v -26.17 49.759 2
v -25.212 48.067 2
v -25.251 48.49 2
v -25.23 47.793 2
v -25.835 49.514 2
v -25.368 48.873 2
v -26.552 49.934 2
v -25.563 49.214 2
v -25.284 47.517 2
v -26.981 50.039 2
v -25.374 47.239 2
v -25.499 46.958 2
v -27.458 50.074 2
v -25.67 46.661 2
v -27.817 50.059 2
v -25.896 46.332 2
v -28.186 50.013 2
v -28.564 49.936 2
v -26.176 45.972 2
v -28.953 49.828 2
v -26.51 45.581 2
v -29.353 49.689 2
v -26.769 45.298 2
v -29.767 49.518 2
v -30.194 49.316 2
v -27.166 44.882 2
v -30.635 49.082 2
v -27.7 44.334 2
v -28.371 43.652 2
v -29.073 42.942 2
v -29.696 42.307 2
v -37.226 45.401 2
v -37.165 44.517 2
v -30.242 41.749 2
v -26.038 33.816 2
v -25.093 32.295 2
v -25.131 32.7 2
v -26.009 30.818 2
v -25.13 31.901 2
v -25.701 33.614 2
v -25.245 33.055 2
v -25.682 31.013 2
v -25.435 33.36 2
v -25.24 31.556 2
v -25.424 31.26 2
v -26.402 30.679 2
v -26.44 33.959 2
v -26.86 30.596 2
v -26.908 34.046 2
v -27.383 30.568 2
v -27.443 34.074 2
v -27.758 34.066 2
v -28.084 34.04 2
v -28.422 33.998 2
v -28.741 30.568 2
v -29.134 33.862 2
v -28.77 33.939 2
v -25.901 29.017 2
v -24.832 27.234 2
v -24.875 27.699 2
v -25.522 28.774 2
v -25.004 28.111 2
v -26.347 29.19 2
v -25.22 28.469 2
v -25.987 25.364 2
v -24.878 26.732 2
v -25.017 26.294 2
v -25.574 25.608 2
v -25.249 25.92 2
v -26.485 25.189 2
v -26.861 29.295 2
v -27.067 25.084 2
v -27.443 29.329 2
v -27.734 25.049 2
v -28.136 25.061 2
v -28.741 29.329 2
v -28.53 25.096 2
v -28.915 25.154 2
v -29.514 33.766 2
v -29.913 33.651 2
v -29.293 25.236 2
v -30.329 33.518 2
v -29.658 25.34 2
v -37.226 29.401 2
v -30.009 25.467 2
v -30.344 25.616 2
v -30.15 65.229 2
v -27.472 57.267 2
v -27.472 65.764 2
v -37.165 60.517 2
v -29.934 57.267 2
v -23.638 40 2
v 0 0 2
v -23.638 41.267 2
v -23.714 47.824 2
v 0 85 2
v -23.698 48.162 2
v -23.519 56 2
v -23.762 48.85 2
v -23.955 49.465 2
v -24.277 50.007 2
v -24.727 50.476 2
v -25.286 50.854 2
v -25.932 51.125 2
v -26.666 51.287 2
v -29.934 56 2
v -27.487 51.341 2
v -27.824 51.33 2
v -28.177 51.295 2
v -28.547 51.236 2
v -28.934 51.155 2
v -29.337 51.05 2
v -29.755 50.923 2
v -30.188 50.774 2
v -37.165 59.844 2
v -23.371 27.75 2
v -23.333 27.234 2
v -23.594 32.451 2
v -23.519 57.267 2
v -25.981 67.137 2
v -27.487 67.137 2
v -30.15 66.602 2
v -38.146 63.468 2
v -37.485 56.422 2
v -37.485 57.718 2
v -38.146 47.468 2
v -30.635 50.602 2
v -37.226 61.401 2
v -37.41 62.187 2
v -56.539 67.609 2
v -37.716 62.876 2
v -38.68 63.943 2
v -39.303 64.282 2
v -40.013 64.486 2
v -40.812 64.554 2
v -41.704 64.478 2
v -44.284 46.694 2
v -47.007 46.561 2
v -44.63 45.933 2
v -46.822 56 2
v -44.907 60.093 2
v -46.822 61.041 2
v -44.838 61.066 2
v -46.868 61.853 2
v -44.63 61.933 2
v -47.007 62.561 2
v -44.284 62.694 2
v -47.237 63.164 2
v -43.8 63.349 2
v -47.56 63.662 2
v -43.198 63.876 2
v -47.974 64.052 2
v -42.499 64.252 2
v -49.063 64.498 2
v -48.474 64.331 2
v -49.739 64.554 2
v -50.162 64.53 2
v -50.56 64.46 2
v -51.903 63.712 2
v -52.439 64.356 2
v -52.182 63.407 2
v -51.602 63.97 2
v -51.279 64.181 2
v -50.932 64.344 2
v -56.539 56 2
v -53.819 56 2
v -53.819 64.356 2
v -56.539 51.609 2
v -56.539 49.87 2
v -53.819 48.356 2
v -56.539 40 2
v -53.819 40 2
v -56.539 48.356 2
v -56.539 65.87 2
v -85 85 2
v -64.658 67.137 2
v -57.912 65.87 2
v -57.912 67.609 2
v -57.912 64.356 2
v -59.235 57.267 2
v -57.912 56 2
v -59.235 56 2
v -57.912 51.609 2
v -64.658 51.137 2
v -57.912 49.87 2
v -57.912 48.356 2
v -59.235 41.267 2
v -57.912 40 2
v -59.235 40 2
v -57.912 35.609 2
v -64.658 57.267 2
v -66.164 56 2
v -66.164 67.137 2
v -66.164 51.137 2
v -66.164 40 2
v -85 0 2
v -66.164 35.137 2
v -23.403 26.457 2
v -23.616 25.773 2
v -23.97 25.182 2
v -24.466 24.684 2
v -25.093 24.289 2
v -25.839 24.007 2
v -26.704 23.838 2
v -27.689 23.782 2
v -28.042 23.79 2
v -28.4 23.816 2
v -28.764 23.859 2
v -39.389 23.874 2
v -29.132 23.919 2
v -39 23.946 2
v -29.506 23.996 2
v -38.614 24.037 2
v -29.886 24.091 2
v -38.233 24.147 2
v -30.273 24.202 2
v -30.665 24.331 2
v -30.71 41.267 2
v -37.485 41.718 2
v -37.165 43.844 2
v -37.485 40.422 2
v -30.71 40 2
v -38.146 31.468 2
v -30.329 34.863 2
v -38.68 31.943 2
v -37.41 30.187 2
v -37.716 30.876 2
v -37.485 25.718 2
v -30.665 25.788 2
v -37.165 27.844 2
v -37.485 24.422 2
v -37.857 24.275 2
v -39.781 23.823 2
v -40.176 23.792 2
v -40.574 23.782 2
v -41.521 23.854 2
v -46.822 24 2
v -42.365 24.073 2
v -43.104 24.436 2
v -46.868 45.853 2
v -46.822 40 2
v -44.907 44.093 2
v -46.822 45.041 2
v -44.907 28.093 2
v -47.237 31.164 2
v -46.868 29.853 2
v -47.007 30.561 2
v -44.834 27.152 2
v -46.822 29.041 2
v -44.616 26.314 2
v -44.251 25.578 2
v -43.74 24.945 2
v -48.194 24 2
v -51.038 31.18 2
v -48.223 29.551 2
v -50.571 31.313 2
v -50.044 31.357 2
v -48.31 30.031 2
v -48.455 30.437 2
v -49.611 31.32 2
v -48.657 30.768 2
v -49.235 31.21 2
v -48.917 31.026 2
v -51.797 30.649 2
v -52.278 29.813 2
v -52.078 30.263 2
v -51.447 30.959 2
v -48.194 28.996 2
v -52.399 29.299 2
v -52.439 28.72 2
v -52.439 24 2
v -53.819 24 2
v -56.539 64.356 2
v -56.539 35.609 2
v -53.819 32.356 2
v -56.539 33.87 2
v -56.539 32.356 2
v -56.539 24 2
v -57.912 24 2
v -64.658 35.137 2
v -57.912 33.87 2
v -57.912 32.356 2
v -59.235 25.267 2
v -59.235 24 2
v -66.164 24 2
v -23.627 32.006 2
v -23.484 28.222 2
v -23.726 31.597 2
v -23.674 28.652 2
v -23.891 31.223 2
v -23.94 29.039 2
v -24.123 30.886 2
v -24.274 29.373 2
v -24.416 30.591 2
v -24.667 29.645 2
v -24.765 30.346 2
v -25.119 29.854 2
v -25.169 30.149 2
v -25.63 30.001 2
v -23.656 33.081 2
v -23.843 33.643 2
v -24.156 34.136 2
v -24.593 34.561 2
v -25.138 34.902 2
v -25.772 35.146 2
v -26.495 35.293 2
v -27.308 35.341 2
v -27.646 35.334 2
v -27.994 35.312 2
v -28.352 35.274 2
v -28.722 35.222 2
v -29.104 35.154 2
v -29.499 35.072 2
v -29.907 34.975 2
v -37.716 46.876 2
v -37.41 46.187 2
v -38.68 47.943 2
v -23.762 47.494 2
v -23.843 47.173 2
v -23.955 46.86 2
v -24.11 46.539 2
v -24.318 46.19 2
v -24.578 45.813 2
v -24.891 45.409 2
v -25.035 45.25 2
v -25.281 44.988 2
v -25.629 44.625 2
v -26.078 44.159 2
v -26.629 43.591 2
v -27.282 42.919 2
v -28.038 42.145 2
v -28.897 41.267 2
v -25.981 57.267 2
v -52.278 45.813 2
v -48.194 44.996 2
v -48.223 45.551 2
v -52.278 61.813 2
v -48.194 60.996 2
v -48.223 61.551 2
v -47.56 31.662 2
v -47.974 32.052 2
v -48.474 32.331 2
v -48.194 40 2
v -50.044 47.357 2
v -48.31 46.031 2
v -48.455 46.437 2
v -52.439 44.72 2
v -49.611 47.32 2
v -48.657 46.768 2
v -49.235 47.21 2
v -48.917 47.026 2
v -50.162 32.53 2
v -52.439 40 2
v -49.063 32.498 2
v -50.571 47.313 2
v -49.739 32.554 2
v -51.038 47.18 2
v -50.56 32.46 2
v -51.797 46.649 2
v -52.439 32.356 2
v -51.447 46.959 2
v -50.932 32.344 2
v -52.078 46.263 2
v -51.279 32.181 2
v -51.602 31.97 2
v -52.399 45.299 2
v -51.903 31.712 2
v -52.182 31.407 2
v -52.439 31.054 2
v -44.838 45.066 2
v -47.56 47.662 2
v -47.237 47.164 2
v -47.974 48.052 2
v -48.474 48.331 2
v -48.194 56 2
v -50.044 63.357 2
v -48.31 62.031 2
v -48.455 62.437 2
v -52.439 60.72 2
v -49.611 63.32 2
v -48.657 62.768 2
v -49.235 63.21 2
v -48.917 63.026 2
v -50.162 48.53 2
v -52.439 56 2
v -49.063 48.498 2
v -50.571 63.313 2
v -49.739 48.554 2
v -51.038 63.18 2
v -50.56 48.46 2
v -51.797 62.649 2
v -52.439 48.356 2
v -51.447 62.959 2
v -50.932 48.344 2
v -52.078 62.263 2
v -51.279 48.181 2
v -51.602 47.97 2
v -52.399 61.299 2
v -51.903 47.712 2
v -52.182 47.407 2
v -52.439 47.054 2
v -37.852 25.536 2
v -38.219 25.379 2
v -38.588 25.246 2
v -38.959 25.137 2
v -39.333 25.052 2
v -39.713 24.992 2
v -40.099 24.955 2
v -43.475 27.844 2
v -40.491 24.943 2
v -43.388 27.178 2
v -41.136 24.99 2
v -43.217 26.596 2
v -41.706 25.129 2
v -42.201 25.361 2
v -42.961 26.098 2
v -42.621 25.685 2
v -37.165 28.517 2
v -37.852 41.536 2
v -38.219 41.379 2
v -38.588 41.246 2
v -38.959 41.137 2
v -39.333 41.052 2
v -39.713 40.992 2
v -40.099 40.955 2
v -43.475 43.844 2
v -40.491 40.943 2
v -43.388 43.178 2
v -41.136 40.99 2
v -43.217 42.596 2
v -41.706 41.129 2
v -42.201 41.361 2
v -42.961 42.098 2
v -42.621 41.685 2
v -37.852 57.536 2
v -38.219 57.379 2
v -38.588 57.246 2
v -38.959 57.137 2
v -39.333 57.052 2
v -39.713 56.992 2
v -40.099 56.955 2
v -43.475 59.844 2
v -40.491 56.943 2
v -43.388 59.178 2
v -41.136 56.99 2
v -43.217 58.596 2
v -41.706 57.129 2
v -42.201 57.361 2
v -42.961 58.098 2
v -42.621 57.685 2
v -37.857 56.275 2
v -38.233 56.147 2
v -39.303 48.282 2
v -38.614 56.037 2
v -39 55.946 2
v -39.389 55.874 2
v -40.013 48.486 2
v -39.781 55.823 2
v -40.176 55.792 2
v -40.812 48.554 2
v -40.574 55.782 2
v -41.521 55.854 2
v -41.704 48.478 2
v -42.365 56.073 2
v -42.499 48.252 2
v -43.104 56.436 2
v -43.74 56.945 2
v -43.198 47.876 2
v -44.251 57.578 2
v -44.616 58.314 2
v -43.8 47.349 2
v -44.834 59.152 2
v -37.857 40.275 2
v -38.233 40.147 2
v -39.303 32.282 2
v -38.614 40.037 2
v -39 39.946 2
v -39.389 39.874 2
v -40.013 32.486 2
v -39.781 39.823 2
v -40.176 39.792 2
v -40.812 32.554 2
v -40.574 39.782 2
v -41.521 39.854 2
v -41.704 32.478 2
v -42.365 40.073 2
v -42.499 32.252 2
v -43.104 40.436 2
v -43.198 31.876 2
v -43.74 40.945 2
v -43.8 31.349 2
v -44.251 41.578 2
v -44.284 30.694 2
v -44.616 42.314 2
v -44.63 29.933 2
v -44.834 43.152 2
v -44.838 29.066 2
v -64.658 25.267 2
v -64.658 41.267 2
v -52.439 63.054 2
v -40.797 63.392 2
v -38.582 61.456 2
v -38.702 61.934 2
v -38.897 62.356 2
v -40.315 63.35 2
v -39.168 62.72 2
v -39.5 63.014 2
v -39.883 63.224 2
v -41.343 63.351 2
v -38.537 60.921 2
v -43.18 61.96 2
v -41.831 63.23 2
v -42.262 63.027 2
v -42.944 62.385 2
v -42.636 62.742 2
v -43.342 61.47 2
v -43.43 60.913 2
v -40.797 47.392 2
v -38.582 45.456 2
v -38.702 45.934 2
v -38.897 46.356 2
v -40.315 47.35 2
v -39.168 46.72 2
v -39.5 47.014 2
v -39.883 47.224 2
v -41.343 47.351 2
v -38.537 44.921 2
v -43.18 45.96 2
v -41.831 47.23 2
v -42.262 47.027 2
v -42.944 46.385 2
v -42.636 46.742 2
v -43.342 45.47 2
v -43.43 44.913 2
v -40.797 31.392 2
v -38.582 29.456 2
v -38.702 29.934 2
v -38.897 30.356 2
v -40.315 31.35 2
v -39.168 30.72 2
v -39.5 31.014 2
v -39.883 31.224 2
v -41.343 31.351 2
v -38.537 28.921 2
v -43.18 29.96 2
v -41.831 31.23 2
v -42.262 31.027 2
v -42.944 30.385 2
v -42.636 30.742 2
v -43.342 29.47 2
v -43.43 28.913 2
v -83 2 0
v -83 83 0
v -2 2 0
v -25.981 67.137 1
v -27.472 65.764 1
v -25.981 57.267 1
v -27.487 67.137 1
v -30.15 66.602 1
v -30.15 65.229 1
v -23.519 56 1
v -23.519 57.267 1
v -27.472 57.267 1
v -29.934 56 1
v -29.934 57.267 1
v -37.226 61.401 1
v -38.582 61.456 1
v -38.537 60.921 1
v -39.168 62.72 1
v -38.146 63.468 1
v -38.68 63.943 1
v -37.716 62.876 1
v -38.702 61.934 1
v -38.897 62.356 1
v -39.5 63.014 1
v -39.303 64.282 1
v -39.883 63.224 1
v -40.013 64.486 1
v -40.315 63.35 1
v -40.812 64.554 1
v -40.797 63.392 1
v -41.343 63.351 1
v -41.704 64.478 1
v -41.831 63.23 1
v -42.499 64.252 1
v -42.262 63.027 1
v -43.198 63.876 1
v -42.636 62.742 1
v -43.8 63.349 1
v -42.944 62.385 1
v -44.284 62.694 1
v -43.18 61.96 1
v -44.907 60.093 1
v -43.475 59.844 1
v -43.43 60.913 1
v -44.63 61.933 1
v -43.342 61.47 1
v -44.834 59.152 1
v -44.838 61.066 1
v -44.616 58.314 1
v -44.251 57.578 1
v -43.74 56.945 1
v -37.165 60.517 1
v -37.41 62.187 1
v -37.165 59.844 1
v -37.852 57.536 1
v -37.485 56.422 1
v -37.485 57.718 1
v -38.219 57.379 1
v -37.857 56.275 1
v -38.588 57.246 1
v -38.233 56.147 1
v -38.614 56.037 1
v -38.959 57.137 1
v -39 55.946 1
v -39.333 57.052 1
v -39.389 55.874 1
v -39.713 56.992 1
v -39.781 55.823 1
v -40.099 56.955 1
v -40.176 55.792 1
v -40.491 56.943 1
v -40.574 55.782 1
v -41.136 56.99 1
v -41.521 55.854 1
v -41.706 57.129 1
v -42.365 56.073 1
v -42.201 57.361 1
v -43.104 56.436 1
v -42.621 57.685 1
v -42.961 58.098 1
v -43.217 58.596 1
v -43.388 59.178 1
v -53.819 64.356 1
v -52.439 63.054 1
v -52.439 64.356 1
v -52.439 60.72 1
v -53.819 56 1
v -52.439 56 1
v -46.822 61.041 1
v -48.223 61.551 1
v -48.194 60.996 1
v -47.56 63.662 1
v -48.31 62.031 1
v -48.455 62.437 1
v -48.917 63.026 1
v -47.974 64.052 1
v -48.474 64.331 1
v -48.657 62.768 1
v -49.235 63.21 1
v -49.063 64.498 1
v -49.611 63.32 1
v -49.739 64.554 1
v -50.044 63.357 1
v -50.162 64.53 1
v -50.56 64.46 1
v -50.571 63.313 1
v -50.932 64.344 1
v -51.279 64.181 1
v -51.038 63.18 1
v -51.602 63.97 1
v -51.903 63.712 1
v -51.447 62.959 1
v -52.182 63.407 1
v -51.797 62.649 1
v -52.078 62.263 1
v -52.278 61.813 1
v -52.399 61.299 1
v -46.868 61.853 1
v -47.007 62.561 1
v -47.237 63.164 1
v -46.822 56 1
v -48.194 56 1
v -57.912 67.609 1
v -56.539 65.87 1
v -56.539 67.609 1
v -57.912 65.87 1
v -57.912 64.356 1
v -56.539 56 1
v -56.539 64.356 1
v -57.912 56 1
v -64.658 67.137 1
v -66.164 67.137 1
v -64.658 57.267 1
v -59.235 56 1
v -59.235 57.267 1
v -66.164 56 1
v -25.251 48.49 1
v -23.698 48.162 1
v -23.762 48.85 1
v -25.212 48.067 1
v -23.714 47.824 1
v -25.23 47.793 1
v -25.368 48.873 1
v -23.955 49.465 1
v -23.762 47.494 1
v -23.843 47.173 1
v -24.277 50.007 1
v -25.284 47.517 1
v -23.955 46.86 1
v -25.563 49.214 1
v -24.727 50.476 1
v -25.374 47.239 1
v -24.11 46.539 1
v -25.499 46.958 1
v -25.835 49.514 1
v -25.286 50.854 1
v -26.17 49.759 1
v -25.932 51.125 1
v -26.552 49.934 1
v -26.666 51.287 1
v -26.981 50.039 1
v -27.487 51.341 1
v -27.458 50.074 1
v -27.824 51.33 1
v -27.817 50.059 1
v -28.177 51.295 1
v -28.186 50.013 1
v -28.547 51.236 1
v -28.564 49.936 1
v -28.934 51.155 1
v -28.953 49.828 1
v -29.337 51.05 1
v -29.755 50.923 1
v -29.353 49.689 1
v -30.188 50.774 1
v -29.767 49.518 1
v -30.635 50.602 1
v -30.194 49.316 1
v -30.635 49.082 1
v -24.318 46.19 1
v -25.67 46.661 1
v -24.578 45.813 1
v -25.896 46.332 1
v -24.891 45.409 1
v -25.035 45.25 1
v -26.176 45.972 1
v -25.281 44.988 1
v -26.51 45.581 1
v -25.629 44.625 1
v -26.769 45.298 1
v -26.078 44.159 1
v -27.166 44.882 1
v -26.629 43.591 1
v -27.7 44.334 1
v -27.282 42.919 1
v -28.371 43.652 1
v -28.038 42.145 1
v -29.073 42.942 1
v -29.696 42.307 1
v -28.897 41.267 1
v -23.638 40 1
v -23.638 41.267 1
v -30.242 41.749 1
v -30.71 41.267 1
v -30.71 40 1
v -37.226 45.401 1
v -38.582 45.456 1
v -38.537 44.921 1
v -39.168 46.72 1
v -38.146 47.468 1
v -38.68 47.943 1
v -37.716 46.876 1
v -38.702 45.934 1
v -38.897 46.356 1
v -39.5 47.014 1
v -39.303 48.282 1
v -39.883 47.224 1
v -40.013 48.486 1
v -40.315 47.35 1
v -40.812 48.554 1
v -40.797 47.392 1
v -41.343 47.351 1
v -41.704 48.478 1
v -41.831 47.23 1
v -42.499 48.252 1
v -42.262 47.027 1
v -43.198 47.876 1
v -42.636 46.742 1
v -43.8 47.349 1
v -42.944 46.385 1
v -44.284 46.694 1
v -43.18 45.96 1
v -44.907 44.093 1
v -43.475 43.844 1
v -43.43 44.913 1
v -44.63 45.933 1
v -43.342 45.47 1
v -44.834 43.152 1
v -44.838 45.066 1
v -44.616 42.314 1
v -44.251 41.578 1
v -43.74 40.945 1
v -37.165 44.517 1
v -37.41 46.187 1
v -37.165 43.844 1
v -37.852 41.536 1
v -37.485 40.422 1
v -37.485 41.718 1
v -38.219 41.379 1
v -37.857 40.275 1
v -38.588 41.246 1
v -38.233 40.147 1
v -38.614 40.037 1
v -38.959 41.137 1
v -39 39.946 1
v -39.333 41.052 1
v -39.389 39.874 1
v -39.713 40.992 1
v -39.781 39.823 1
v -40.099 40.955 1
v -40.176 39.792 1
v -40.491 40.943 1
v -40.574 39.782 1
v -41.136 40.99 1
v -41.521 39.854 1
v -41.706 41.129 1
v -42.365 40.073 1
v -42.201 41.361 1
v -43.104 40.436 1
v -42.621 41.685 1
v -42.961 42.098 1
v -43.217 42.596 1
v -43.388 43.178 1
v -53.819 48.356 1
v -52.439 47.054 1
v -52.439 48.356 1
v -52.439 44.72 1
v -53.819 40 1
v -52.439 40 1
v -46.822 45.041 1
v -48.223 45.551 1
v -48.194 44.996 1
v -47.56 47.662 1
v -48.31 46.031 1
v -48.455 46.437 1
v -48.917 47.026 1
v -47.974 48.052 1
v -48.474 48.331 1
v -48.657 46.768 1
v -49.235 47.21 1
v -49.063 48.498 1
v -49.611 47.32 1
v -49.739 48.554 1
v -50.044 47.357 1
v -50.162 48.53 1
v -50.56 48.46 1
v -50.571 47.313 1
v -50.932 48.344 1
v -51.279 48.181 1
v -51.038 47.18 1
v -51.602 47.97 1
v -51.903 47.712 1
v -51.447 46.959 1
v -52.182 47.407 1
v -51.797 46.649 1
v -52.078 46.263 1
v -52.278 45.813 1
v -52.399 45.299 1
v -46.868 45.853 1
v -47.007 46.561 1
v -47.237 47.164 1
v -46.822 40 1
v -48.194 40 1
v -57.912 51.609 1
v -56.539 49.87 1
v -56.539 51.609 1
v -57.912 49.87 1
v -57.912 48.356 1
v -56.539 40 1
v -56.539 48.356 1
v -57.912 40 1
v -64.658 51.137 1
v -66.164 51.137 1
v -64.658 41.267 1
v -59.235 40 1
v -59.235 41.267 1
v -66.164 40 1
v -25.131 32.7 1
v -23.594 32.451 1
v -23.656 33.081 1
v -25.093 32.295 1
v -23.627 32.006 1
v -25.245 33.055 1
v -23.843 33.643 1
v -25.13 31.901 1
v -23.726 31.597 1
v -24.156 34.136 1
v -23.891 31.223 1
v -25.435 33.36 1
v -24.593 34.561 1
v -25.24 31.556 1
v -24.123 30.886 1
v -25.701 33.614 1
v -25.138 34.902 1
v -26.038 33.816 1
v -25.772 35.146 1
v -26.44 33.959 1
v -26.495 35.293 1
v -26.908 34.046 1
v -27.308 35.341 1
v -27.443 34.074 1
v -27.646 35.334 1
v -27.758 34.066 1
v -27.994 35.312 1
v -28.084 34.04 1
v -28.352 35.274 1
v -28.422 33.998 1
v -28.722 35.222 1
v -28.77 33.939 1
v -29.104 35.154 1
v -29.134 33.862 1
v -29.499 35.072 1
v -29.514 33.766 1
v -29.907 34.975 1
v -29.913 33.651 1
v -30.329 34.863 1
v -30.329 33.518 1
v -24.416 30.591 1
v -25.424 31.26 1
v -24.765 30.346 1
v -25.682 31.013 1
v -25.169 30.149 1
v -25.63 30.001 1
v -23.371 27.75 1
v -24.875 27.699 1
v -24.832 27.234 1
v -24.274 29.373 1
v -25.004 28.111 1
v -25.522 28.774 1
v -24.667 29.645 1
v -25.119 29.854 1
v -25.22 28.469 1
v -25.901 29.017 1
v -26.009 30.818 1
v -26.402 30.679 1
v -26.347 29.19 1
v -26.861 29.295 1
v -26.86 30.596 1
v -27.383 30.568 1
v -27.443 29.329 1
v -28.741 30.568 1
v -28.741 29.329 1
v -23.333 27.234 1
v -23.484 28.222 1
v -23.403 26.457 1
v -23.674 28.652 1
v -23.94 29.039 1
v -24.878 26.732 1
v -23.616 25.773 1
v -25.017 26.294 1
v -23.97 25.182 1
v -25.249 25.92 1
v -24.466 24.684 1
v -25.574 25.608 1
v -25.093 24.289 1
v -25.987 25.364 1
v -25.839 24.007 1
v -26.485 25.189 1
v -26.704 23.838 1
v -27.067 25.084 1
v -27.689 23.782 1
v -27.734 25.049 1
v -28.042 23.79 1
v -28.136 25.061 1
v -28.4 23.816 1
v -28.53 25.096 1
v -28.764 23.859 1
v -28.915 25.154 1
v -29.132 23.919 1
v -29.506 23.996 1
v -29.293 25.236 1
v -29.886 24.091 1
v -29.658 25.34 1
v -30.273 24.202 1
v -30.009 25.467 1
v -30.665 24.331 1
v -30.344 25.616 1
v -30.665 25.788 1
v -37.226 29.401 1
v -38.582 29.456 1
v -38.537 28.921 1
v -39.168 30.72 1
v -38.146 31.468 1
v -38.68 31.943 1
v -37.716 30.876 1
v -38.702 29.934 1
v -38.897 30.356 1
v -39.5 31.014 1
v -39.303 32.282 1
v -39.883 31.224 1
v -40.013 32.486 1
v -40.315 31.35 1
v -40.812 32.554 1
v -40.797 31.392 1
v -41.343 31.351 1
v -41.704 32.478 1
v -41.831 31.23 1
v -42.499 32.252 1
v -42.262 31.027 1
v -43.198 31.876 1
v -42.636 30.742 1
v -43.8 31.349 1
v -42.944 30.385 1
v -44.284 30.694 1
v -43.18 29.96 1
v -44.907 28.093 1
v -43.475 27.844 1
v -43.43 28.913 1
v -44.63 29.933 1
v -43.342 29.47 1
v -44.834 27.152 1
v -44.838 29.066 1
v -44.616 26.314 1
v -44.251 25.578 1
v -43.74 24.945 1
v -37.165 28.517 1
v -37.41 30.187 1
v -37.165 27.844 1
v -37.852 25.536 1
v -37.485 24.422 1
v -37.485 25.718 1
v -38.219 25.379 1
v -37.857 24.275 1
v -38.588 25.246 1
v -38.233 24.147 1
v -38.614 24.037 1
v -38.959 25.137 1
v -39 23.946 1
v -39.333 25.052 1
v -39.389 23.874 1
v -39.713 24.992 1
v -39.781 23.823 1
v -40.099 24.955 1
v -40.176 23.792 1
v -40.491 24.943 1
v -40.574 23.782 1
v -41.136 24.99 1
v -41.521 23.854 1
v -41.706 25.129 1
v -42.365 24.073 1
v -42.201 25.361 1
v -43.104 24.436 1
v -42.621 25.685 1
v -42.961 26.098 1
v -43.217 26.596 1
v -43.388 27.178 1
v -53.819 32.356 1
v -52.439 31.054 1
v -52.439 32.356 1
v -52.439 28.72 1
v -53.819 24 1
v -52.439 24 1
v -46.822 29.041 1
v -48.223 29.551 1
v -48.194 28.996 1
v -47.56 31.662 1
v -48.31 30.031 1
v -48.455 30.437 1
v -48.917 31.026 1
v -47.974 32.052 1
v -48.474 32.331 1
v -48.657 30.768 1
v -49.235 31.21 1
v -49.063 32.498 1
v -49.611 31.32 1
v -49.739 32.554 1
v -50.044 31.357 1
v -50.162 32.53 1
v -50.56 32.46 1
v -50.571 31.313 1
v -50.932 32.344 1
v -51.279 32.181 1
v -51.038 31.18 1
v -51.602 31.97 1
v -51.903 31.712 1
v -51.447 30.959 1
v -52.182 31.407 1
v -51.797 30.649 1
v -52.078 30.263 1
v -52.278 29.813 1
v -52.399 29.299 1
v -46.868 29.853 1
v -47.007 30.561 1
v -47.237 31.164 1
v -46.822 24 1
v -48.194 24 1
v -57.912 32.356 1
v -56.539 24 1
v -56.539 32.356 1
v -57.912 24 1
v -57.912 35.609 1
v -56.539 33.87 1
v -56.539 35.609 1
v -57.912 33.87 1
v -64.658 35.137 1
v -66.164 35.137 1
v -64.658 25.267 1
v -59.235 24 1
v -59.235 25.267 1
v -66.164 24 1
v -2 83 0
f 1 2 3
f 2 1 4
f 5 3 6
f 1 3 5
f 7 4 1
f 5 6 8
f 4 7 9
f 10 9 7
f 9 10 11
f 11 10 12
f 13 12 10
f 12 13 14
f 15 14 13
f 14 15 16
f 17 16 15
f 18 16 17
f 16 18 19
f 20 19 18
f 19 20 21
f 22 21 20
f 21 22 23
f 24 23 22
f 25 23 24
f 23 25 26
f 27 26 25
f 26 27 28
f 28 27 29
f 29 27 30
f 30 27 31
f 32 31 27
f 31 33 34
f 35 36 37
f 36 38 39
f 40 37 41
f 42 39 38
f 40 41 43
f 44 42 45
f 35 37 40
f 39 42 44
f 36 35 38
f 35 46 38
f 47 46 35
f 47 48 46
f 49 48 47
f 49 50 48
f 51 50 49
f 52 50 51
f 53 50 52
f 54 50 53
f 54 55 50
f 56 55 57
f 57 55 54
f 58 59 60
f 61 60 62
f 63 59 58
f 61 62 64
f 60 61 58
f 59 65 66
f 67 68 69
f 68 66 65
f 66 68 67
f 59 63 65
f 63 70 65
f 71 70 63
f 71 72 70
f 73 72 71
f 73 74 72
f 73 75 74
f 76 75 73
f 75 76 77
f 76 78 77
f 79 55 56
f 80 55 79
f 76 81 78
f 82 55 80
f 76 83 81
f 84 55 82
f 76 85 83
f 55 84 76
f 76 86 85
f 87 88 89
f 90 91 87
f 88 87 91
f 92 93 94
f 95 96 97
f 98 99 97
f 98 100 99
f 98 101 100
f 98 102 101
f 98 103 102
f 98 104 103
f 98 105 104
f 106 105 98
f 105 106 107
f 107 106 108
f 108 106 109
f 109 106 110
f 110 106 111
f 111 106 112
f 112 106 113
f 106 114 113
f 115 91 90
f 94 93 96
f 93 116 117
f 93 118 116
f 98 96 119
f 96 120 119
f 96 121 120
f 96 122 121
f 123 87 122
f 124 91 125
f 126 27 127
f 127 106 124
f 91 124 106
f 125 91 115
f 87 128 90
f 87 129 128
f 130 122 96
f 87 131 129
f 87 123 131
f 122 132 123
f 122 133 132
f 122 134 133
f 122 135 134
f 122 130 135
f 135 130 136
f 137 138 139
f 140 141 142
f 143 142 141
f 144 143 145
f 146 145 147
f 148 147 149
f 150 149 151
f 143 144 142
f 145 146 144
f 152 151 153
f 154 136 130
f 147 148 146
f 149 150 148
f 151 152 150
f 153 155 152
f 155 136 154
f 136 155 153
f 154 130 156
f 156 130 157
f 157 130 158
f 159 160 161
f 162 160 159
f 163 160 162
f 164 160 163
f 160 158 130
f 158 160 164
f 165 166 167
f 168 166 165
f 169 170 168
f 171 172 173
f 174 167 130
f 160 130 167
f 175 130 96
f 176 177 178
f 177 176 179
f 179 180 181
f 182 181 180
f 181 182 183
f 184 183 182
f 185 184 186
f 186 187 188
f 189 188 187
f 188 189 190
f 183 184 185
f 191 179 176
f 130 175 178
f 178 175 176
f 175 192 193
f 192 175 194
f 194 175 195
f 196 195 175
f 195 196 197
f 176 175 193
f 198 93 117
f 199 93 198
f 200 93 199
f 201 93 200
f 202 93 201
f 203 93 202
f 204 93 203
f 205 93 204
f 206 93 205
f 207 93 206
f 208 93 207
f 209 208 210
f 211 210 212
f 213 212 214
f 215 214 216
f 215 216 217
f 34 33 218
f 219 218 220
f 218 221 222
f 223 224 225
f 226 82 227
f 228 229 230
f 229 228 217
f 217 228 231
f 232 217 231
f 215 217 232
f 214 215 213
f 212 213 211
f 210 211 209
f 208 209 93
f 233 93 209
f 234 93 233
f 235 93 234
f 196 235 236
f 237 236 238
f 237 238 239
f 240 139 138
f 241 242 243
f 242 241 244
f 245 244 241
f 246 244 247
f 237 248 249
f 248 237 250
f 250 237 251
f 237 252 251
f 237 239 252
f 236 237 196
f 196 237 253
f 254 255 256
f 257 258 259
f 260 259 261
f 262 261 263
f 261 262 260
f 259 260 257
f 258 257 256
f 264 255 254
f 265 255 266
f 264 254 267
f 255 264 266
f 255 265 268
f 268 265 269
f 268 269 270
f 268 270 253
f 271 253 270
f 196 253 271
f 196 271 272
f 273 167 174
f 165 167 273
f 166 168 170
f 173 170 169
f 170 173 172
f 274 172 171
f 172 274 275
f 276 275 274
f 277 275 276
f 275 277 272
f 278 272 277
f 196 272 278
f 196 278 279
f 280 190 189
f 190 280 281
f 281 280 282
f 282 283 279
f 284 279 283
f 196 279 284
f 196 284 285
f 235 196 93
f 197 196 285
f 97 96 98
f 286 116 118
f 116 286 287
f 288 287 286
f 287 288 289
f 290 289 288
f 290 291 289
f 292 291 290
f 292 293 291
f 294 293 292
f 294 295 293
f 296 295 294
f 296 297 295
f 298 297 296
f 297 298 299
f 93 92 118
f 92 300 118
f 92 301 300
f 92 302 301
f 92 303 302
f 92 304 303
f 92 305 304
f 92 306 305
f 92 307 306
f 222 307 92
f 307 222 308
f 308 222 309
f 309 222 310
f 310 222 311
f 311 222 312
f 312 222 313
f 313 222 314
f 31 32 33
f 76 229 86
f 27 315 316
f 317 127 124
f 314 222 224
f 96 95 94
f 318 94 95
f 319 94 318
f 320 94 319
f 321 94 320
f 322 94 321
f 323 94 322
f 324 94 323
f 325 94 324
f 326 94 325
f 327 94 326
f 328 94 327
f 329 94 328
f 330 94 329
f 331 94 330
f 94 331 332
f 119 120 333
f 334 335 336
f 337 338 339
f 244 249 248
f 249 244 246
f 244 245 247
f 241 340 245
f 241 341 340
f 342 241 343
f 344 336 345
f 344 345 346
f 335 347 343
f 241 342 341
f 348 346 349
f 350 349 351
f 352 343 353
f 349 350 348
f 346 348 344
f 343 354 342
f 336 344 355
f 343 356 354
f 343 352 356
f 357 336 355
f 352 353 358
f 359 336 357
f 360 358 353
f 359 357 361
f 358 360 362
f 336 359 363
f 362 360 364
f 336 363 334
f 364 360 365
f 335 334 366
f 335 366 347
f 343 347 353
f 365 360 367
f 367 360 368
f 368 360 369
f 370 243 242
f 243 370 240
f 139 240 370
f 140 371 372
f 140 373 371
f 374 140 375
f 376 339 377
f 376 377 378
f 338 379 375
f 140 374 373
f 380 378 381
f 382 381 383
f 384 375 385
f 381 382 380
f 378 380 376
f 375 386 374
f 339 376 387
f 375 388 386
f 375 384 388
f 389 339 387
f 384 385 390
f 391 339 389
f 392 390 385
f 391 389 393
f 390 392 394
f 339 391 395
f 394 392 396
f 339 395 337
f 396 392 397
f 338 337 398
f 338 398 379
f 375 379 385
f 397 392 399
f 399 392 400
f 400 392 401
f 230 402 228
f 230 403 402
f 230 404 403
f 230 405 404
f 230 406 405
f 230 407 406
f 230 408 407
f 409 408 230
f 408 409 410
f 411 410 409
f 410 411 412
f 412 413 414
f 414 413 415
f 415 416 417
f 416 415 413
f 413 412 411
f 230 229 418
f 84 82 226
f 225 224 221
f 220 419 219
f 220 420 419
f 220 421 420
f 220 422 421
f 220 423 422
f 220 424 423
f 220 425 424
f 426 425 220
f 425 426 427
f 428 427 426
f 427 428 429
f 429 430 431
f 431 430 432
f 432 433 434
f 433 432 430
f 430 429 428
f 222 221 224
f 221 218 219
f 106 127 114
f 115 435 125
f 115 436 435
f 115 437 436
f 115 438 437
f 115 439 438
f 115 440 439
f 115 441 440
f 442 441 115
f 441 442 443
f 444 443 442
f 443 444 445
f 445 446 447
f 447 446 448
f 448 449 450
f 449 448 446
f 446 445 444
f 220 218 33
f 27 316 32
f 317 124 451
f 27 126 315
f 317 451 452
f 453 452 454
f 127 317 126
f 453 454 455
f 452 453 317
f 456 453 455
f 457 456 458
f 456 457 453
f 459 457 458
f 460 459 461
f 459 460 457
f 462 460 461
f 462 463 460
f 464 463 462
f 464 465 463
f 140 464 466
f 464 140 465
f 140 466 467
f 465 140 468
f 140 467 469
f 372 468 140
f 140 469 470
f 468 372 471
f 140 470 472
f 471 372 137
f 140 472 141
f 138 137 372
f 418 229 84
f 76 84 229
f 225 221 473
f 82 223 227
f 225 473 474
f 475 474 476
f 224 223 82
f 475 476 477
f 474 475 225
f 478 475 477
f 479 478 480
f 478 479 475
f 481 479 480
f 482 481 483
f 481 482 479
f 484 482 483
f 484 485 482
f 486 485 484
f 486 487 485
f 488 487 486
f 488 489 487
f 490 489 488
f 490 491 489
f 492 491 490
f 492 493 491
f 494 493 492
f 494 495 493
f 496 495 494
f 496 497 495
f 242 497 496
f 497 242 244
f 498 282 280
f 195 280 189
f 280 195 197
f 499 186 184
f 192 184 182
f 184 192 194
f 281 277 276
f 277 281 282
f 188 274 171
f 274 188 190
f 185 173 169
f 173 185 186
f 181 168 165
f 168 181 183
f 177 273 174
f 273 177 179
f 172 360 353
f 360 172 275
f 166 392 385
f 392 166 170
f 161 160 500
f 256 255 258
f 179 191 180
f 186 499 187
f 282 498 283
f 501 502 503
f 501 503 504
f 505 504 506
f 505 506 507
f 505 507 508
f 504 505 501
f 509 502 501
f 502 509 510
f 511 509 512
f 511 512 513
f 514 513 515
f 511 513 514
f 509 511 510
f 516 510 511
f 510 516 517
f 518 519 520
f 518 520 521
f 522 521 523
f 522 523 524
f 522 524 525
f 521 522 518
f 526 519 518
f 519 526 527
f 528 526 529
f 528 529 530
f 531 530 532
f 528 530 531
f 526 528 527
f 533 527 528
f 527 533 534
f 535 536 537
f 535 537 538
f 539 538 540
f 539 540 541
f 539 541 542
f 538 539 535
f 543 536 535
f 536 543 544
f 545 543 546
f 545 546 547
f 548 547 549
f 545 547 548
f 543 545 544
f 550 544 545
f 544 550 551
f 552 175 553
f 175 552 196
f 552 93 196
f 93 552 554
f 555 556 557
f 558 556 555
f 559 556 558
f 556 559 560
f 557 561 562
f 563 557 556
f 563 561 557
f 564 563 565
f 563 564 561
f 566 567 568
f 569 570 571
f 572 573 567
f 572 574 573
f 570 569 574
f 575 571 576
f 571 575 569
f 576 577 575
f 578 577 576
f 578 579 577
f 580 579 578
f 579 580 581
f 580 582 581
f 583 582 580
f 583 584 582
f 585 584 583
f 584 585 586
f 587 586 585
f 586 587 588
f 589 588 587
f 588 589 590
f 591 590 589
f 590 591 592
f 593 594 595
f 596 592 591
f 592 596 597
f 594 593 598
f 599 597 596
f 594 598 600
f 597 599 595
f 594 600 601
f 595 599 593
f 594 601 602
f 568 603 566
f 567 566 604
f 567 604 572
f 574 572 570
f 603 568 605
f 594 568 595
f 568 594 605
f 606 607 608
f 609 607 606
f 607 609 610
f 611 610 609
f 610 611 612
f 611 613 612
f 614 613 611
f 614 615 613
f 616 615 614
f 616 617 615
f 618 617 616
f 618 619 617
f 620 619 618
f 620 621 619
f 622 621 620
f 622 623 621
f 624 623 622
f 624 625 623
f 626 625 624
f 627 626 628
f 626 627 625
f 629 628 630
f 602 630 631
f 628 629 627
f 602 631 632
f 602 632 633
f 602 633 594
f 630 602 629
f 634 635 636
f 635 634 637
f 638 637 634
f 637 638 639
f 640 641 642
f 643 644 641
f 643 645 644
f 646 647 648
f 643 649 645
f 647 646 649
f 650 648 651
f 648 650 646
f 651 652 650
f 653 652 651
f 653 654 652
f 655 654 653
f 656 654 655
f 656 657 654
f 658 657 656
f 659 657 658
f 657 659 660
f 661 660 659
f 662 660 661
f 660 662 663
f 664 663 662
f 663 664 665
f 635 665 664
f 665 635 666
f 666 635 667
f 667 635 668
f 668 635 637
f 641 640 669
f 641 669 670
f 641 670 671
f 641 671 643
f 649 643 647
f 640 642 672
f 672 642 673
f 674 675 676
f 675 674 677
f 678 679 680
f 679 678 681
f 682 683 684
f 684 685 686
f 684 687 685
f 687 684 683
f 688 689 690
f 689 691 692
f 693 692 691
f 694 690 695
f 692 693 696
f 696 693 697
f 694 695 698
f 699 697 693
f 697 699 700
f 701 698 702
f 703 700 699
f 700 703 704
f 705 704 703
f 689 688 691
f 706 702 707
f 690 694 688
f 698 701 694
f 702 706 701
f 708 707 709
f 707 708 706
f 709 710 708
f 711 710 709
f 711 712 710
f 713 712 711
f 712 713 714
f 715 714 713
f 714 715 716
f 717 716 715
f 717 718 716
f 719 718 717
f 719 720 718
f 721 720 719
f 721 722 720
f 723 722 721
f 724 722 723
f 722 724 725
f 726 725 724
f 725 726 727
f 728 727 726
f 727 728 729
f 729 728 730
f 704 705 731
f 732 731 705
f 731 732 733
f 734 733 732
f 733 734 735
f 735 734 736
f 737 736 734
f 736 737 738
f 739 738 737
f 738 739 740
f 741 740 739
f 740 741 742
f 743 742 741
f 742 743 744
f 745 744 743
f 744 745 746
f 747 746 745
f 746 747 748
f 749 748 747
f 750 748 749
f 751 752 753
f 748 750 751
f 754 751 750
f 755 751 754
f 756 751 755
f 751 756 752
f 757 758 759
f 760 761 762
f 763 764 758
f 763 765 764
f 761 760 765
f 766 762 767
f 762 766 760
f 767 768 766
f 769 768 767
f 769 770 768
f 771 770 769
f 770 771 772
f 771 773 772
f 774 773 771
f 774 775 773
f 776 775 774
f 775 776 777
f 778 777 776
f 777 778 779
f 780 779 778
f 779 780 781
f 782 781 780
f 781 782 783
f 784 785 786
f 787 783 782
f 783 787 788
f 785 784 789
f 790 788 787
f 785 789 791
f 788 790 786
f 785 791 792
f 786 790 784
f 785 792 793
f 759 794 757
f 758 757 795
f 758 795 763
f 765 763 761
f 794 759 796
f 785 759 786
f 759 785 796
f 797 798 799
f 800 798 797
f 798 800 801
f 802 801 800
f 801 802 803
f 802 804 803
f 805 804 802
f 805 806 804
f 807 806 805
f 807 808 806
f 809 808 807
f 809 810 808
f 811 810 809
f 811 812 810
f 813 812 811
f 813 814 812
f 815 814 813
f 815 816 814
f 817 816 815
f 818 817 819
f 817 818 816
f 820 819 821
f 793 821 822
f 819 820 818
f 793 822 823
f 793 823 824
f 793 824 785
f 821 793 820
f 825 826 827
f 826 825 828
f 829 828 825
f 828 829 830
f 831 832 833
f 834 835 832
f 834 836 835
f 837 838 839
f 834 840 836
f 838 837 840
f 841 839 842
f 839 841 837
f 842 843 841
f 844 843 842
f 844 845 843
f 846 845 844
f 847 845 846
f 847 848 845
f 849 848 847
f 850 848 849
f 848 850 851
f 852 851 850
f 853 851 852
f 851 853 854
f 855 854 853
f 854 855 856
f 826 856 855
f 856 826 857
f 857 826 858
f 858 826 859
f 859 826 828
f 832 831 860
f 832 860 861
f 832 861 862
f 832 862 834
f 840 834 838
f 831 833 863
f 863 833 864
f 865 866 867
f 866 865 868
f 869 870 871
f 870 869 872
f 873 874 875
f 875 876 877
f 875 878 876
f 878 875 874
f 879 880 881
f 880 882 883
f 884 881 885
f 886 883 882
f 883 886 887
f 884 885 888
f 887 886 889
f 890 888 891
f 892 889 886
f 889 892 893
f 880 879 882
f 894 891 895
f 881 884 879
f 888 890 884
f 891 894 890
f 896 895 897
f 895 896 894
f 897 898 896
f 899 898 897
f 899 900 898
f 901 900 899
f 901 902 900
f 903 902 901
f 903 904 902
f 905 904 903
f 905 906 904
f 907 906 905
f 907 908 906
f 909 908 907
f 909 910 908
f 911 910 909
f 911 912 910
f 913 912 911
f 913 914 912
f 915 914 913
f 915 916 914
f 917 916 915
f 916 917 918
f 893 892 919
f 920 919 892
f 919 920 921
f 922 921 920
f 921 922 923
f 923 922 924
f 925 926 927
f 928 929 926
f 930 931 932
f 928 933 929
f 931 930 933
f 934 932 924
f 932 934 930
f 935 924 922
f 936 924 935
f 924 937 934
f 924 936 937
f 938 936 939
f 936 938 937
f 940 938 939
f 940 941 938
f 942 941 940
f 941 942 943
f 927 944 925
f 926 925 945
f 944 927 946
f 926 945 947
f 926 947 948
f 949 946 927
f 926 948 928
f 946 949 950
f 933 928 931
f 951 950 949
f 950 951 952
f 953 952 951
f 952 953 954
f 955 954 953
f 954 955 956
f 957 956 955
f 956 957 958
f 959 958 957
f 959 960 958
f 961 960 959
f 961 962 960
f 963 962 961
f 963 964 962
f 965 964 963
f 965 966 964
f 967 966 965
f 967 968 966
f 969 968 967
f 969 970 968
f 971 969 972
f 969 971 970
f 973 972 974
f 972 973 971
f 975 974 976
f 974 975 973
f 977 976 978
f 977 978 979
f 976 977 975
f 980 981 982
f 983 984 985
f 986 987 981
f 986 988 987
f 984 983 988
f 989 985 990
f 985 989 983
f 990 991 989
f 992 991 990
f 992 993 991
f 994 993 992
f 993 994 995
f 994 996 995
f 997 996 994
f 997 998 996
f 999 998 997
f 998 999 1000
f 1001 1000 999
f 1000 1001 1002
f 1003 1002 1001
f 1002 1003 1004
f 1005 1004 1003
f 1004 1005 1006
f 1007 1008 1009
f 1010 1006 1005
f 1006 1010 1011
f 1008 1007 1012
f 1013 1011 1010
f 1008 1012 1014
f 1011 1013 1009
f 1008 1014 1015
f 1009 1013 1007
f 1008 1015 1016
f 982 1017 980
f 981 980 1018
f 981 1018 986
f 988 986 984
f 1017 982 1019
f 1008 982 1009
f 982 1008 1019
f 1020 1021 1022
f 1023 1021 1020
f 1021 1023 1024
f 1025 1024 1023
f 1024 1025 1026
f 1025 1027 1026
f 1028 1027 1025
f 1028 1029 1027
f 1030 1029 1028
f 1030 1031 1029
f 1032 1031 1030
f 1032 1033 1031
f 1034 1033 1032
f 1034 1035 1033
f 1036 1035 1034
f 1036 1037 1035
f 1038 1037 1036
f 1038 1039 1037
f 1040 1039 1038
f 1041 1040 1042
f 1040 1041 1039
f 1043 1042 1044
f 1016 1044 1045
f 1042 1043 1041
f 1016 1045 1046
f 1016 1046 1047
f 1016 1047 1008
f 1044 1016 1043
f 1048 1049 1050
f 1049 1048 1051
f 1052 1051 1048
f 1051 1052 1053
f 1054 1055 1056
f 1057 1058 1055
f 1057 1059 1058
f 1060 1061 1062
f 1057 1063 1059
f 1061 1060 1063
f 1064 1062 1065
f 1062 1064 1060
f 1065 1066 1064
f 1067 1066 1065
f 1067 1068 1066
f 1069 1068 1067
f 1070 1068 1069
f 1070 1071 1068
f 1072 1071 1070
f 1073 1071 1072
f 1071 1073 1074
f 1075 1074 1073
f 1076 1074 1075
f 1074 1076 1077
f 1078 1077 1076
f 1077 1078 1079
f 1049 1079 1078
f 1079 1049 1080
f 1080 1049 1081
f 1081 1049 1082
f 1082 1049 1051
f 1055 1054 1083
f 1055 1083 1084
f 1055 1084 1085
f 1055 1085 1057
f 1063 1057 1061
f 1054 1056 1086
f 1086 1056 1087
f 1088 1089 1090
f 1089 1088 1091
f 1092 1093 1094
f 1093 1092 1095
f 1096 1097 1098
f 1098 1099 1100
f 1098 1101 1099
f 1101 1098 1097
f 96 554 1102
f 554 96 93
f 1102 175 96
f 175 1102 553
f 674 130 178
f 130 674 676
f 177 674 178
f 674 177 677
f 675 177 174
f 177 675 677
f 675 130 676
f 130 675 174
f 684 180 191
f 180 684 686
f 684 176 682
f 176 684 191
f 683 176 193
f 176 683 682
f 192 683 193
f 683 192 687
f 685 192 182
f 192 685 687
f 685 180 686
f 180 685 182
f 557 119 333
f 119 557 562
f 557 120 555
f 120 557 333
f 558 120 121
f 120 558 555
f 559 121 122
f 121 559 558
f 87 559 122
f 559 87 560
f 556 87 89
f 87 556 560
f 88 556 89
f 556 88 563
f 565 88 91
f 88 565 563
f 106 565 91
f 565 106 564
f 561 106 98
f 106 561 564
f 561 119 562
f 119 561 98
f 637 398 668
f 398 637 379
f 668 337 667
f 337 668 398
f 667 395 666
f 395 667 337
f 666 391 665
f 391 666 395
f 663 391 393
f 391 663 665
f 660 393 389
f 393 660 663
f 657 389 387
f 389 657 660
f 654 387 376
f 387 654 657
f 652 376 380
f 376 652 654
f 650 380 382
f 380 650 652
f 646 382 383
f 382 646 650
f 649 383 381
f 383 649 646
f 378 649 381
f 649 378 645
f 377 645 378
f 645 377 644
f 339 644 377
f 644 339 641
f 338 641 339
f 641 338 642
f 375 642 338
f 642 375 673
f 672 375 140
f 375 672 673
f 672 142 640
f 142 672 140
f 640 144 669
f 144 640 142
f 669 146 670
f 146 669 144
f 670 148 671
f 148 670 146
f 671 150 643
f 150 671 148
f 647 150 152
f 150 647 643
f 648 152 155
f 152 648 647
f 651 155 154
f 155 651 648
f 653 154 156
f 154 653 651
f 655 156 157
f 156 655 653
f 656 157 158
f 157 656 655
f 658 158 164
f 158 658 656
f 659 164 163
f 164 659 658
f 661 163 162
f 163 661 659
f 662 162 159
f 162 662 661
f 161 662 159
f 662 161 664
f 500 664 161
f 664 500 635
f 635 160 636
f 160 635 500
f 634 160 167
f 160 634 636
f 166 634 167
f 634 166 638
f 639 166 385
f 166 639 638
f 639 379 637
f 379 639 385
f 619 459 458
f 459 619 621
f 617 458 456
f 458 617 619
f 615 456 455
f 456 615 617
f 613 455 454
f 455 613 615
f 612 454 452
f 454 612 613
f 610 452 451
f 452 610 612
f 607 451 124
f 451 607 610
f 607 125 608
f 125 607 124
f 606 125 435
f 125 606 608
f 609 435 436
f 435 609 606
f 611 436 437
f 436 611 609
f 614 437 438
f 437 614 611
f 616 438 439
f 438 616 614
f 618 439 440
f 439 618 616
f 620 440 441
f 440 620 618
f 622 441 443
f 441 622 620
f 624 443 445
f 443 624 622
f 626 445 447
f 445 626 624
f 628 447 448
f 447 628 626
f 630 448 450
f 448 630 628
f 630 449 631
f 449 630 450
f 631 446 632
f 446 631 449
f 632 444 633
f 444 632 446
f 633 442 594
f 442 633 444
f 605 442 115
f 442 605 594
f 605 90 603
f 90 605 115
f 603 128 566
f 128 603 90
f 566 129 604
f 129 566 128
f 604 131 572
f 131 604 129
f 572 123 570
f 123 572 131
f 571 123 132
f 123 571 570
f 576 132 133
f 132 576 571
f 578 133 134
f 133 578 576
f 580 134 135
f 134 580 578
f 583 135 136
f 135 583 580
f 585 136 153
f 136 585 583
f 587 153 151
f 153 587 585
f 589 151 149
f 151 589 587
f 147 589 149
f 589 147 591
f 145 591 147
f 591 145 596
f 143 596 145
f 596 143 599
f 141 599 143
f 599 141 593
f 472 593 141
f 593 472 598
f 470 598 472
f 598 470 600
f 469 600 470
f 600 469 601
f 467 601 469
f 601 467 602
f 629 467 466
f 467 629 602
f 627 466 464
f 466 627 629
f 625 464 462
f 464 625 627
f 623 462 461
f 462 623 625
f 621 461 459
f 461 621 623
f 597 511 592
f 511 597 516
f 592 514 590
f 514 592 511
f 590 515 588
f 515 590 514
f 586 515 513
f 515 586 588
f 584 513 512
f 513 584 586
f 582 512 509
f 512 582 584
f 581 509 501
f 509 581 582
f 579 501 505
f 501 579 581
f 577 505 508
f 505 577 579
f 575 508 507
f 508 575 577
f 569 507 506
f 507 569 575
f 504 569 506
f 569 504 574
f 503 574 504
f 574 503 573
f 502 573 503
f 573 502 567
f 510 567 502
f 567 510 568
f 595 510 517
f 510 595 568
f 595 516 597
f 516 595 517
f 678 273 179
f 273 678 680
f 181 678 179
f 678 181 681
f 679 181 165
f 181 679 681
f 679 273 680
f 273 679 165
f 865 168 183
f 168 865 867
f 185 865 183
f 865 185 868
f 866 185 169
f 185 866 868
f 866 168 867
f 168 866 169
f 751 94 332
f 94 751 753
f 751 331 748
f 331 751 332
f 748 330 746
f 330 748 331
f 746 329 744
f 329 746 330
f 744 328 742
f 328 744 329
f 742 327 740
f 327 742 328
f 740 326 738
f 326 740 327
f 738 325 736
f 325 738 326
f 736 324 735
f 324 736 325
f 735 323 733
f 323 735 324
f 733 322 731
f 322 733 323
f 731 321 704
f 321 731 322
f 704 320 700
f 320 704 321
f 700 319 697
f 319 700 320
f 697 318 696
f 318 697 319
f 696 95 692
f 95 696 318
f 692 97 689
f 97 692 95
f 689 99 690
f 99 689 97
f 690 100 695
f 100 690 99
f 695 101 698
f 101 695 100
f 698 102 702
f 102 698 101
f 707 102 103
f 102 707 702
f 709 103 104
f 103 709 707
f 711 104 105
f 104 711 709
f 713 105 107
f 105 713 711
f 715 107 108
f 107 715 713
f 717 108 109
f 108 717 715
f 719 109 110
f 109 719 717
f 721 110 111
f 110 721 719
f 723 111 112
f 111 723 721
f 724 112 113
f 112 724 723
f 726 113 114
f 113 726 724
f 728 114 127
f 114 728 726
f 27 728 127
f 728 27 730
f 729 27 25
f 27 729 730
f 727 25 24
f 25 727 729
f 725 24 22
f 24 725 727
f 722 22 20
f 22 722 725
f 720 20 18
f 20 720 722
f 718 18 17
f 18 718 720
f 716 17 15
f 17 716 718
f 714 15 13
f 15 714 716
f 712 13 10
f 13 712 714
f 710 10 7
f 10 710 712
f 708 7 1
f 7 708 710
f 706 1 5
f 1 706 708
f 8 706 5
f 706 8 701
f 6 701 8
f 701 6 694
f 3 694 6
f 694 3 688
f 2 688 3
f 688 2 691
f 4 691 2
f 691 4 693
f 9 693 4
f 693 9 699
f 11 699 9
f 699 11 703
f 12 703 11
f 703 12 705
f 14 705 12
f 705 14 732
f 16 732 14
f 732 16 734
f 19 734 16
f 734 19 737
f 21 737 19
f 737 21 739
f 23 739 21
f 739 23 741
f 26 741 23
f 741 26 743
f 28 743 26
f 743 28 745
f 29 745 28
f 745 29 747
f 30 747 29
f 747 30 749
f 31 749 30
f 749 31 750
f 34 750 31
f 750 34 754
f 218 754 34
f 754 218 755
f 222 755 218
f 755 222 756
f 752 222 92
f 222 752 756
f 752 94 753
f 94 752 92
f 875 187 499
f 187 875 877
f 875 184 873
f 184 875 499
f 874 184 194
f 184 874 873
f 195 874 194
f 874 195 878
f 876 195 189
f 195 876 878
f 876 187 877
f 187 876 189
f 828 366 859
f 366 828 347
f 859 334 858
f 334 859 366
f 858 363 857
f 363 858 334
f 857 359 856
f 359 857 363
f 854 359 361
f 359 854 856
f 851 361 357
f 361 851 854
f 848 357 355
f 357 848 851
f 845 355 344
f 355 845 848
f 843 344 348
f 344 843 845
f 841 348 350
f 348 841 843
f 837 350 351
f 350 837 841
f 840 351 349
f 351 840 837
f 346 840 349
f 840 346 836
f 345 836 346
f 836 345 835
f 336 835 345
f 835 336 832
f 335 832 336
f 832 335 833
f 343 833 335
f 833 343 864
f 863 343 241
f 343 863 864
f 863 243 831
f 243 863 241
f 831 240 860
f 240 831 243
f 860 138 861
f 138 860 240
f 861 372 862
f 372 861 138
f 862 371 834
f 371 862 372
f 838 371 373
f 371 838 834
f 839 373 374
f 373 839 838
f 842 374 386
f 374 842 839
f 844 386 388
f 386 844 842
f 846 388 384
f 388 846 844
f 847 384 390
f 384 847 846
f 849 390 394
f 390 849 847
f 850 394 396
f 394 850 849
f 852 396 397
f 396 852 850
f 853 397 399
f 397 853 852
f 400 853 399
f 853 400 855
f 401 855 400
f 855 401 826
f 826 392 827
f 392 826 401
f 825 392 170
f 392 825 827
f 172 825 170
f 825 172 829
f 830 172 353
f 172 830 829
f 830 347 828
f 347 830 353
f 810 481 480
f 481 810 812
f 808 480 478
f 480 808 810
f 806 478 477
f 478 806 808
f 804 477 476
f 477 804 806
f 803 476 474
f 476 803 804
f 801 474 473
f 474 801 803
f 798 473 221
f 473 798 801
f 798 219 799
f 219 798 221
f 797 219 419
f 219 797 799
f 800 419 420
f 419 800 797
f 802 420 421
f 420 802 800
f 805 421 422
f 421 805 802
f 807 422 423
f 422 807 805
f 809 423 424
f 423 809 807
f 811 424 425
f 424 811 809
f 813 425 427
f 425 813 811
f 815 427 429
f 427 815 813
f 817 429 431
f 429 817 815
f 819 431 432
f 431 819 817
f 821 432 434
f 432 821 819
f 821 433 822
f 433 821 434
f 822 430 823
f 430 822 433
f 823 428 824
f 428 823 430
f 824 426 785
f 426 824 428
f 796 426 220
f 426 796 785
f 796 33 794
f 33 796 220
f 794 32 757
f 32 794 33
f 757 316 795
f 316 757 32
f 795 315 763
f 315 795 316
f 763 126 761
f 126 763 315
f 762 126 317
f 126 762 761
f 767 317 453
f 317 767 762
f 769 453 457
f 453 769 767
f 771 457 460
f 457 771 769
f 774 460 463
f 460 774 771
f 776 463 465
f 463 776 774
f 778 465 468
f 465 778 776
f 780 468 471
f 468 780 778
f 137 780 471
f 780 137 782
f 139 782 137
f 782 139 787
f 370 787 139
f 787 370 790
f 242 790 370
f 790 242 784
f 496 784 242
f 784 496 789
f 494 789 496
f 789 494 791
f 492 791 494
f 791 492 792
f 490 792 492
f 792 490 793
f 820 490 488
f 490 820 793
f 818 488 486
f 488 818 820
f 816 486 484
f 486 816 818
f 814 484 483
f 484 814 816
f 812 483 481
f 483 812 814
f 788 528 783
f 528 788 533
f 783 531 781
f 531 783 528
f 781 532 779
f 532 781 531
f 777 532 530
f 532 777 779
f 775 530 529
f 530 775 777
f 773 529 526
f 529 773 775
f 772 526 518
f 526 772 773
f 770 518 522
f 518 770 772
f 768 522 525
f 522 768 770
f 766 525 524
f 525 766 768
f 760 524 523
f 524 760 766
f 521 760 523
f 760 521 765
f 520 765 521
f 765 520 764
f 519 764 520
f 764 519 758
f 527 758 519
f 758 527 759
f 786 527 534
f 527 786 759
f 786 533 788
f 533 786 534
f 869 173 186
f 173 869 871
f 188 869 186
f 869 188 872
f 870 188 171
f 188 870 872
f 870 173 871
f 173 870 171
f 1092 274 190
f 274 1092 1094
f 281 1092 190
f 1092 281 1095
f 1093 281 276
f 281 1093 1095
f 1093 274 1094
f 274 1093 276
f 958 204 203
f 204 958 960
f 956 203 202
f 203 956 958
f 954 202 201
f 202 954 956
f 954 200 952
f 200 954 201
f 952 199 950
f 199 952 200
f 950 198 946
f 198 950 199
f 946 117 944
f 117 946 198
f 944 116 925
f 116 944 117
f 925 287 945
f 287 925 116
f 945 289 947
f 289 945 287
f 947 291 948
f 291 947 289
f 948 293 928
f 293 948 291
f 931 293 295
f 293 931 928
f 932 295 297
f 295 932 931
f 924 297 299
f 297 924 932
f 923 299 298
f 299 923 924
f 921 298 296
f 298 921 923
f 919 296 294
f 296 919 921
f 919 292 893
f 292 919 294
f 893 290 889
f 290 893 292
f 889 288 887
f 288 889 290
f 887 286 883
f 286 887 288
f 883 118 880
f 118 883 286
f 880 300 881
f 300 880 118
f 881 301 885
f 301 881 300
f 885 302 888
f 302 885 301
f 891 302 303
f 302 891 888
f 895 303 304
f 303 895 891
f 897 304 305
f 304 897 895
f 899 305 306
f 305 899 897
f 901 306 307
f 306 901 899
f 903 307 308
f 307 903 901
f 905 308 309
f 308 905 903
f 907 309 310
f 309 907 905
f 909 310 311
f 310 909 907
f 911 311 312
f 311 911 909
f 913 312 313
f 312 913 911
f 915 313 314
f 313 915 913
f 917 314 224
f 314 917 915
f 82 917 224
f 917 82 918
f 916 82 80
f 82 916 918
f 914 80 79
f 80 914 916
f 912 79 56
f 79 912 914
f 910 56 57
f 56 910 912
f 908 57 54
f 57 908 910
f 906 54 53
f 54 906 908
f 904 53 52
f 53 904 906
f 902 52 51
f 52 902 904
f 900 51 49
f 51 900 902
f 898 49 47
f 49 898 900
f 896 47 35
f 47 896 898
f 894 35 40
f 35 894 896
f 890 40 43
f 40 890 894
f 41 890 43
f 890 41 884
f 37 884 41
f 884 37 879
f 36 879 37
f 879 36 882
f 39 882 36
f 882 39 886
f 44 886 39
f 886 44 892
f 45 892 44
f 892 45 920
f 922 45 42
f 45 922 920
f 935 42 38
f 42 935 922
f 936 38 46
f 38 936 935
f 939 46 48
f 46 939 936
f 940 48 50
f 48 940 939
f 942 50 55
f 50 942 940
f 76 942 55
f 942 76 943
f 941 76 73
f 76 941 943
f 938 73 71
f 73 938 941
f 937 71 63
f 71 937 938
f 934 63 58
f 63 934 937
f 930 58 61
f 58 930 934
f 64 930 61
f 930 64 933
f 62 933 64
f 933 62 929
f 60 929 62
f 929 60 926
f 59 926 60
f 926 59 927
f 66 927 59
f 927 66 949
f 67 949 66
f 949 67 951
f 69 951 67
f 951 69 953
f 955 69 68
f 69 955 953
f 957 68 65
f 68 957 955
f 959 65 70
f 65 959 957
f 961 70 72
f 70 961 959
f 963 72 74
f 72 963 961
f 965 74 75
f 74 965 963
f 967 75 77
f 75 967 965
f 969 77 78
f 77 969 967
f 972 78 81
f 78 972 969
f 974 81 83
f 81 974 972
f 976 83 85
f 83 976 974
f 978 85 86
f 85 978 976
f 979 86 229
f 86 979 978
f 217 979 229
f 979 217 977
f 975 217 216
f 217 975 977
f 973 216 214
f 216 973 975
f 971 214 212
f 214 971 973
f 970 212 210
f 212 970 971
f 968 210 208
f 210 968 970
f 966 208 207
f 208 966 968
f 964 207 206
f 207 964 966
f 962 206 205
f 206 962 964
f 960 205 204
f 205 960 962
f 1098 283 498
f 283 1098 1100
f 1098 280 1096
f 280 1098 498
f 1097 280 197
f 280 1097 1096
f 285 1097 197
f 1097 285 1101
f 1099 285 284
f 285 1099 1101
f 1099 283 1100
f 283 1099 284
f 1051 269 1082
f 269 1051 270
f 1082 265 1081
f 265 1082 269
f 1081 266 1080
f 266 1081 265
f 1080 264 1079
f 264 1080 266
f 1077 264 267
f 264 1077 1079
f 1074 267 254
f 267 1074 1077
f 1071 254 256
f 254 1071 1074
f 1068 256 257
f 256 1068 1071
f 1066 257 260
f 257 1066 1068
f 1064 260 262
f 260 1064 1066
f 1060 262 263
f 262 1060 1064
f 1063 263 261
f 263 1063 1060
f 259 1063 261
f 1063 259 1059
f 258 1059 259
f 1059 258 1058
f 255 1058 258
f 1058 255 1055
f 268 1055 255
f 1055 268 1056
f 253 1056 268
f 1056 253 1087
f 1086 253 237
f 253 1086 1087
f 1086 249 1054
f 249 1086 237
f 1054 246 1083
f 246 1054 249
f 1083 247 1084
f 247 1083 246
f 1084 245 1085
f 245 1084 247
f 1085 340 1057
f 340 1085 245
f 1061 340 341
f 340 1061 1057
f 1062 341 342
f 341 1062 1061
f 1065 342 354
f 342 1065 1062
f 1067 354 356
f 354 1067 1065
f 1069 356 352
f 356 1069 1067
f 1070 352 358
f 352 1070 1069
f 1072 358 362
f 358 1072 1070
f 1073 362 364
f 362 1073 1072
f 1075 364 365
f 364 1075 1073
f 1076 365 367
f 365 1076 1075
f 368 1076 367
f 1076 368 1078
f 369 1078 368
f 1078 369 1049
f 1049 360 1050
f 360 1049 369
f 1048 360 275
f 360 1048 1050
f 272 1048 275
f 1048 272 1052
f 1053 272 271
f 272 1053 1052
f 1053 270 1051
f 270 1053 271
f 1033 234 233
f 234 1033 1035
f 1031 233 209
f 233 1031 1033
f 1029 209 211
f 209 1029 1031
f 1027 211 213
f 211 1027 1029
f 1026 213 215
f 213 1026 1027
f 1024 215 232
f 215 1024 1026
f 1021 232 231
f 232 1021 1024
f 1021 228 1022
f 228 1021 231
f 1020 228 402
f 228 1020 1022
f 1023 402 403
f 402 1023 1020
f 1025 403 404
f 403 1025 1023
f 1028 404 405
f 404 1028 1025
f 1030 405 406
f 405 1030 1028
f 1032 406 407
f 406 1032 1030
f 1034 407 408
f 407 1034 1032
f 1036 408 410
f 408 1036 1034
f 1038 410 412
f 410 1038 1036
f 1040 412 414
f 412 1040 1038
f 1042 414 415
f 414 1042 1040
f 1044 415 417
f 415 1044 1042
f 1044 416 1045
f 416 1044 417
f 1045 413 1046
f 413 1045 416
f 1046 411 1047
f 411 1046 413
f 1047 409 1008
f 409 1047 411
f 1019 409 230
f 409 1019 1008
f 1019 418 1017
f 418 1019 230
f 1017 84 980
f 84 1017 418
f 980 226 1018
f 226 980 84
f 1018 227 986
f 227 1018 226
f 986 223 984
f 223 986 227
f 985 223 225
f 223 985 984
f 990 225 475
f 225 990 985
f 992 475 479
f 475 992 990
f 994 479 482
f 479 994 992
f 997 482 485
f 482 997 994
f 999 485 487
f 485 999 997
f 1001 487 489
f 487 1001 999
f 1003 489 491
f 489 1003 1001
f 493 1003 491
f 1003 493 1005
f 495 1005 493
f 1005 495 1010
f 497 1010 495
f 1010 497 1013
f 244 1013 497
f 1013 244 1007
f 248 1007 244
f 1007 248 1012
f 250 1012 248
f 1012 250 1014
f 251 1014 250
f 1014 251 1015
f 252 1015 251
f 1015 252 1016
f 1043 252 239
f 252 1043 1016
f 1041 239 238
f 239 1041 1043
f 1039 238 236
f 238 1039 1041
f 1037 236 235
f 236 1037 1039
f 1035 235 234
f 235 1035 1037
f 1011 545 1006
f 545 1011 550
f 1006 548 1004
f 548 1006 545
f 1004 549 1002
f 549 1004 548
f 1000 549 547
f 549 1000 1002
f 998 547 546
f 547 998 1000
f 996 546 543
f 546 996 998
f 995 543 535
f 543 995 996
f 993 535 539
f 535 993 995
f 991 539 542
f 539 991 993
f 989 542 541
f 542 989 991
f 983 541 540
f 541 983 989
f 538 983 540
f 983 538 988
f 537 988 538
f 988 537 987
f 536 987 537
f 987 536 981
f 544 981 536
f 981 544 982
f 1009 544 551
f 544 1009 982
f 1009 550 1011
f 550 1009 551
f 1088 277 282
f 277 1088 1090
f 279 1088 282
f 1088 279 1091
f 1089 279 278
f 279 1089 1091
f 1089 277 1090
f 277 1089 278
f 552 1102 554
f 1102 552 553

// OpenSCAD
//Generate Bottom or Lower part (dual extruder)

// Which one would you like to see?
part = "both"; // [lower:lower part only,upper:upper part only ,both:lower and upper part]

// Enter your text Line 1
    text_box1 = "Line 1";
// Enter your text Line 2
    text_box2 = "Line 2";
// Enter your text Line 3
    text_box3= "Line 3";
// Enter text size
    text_size= 11; 
 
 
CubeFaces = [
  [0,1,2,3],  // bottom
  [4,5,1,0],  // front
  [7,6,5,4],  // top
  [5,6,2,1],  // right
  [6,7,3,2],  // back
  [7,4,0,3]]; // left

CubePointslower = [
   [  0,  0,  0 ],  //0
  [ 85,  0,  0 ],  //1
  [ 85,  85,  0 ],  //2
  [  0,  85,  0 ],  //3
  [  1,  1,  1 ],  //4
  [84,  1,  1 ],  //5
  [ 84,  84,  1 ],  //6
  [  1,  84,  1 ]]; //7
  
CubePointsHigher = [
[  1,  1,  1 ],  //0
[ 84,  1,  1 ],  //1
[ 84,  84,  1 ],  //2
[  1,  84,  1 ],  //3
[  2,  2,  2 ],  //4
[83,  2,  2 ],  //5
[ 83,  83,  2 ],  //6
[  2,  83,  2 ]]; //7


//CubePointsZwisp = [
//   [  0,  0,  0 ],  //0
//  [ 85,  0,  0 ],  //1
//  [ 85,  85,  0 ],  //2
//  [  0,  85,  0 ],  //3
//  [  2,  2,  2 ],  //4
//  [83,  2,  2 ],  //5
//  [ 83,  83,  2 ],  //6
//  [  2,  83,  2 ]]; //7

//START GENERATING THE OBJECCT
rotate (a=[0,180,0])
translate([0,0,-2]) 
{
{
//GENERATE THE LOWER PLATE
if (part=="both" || part == "upper")
{
color("crimson"){
// create poly
polyhedron( CubePointsHigher, CubeFaces );
}
}
//GENERATE THE UPPER PLATE WITH TEXT
if (part=="both" || part == "lower")
{
difference() {
    // create poly
polyhedron( CubePointslower, CubeFaces );

// text(scale) {
font1 = "Archivo Black"; // here you can select other font type

translate ([45,56,40]) {
rotate ([0,180,0]) {
linear_extrude(height = 60) {
text(text_box1, font = font1, size = text_size, halign="center",  direction = "ltr", spacing = 1 );
    ;
}
}
}
translate ([45,40,40]) {
rotate ([0,180,0]) {
linear_extrude(height = 60) {
text(text_box2, font = font1, size = text_size, halign="center",  direction = "ltr", spacing = 1 );
    ;
}
}
}
translate ([45,24,40]) {
rotate ([0,180,0]) {
linear_extrude(height = 60) {
text(text_box3, font = font1, size = text_size, halign="center",  direction = "ltr", spacing = 1 );
    ;
}
}
}
}
}
}
}
